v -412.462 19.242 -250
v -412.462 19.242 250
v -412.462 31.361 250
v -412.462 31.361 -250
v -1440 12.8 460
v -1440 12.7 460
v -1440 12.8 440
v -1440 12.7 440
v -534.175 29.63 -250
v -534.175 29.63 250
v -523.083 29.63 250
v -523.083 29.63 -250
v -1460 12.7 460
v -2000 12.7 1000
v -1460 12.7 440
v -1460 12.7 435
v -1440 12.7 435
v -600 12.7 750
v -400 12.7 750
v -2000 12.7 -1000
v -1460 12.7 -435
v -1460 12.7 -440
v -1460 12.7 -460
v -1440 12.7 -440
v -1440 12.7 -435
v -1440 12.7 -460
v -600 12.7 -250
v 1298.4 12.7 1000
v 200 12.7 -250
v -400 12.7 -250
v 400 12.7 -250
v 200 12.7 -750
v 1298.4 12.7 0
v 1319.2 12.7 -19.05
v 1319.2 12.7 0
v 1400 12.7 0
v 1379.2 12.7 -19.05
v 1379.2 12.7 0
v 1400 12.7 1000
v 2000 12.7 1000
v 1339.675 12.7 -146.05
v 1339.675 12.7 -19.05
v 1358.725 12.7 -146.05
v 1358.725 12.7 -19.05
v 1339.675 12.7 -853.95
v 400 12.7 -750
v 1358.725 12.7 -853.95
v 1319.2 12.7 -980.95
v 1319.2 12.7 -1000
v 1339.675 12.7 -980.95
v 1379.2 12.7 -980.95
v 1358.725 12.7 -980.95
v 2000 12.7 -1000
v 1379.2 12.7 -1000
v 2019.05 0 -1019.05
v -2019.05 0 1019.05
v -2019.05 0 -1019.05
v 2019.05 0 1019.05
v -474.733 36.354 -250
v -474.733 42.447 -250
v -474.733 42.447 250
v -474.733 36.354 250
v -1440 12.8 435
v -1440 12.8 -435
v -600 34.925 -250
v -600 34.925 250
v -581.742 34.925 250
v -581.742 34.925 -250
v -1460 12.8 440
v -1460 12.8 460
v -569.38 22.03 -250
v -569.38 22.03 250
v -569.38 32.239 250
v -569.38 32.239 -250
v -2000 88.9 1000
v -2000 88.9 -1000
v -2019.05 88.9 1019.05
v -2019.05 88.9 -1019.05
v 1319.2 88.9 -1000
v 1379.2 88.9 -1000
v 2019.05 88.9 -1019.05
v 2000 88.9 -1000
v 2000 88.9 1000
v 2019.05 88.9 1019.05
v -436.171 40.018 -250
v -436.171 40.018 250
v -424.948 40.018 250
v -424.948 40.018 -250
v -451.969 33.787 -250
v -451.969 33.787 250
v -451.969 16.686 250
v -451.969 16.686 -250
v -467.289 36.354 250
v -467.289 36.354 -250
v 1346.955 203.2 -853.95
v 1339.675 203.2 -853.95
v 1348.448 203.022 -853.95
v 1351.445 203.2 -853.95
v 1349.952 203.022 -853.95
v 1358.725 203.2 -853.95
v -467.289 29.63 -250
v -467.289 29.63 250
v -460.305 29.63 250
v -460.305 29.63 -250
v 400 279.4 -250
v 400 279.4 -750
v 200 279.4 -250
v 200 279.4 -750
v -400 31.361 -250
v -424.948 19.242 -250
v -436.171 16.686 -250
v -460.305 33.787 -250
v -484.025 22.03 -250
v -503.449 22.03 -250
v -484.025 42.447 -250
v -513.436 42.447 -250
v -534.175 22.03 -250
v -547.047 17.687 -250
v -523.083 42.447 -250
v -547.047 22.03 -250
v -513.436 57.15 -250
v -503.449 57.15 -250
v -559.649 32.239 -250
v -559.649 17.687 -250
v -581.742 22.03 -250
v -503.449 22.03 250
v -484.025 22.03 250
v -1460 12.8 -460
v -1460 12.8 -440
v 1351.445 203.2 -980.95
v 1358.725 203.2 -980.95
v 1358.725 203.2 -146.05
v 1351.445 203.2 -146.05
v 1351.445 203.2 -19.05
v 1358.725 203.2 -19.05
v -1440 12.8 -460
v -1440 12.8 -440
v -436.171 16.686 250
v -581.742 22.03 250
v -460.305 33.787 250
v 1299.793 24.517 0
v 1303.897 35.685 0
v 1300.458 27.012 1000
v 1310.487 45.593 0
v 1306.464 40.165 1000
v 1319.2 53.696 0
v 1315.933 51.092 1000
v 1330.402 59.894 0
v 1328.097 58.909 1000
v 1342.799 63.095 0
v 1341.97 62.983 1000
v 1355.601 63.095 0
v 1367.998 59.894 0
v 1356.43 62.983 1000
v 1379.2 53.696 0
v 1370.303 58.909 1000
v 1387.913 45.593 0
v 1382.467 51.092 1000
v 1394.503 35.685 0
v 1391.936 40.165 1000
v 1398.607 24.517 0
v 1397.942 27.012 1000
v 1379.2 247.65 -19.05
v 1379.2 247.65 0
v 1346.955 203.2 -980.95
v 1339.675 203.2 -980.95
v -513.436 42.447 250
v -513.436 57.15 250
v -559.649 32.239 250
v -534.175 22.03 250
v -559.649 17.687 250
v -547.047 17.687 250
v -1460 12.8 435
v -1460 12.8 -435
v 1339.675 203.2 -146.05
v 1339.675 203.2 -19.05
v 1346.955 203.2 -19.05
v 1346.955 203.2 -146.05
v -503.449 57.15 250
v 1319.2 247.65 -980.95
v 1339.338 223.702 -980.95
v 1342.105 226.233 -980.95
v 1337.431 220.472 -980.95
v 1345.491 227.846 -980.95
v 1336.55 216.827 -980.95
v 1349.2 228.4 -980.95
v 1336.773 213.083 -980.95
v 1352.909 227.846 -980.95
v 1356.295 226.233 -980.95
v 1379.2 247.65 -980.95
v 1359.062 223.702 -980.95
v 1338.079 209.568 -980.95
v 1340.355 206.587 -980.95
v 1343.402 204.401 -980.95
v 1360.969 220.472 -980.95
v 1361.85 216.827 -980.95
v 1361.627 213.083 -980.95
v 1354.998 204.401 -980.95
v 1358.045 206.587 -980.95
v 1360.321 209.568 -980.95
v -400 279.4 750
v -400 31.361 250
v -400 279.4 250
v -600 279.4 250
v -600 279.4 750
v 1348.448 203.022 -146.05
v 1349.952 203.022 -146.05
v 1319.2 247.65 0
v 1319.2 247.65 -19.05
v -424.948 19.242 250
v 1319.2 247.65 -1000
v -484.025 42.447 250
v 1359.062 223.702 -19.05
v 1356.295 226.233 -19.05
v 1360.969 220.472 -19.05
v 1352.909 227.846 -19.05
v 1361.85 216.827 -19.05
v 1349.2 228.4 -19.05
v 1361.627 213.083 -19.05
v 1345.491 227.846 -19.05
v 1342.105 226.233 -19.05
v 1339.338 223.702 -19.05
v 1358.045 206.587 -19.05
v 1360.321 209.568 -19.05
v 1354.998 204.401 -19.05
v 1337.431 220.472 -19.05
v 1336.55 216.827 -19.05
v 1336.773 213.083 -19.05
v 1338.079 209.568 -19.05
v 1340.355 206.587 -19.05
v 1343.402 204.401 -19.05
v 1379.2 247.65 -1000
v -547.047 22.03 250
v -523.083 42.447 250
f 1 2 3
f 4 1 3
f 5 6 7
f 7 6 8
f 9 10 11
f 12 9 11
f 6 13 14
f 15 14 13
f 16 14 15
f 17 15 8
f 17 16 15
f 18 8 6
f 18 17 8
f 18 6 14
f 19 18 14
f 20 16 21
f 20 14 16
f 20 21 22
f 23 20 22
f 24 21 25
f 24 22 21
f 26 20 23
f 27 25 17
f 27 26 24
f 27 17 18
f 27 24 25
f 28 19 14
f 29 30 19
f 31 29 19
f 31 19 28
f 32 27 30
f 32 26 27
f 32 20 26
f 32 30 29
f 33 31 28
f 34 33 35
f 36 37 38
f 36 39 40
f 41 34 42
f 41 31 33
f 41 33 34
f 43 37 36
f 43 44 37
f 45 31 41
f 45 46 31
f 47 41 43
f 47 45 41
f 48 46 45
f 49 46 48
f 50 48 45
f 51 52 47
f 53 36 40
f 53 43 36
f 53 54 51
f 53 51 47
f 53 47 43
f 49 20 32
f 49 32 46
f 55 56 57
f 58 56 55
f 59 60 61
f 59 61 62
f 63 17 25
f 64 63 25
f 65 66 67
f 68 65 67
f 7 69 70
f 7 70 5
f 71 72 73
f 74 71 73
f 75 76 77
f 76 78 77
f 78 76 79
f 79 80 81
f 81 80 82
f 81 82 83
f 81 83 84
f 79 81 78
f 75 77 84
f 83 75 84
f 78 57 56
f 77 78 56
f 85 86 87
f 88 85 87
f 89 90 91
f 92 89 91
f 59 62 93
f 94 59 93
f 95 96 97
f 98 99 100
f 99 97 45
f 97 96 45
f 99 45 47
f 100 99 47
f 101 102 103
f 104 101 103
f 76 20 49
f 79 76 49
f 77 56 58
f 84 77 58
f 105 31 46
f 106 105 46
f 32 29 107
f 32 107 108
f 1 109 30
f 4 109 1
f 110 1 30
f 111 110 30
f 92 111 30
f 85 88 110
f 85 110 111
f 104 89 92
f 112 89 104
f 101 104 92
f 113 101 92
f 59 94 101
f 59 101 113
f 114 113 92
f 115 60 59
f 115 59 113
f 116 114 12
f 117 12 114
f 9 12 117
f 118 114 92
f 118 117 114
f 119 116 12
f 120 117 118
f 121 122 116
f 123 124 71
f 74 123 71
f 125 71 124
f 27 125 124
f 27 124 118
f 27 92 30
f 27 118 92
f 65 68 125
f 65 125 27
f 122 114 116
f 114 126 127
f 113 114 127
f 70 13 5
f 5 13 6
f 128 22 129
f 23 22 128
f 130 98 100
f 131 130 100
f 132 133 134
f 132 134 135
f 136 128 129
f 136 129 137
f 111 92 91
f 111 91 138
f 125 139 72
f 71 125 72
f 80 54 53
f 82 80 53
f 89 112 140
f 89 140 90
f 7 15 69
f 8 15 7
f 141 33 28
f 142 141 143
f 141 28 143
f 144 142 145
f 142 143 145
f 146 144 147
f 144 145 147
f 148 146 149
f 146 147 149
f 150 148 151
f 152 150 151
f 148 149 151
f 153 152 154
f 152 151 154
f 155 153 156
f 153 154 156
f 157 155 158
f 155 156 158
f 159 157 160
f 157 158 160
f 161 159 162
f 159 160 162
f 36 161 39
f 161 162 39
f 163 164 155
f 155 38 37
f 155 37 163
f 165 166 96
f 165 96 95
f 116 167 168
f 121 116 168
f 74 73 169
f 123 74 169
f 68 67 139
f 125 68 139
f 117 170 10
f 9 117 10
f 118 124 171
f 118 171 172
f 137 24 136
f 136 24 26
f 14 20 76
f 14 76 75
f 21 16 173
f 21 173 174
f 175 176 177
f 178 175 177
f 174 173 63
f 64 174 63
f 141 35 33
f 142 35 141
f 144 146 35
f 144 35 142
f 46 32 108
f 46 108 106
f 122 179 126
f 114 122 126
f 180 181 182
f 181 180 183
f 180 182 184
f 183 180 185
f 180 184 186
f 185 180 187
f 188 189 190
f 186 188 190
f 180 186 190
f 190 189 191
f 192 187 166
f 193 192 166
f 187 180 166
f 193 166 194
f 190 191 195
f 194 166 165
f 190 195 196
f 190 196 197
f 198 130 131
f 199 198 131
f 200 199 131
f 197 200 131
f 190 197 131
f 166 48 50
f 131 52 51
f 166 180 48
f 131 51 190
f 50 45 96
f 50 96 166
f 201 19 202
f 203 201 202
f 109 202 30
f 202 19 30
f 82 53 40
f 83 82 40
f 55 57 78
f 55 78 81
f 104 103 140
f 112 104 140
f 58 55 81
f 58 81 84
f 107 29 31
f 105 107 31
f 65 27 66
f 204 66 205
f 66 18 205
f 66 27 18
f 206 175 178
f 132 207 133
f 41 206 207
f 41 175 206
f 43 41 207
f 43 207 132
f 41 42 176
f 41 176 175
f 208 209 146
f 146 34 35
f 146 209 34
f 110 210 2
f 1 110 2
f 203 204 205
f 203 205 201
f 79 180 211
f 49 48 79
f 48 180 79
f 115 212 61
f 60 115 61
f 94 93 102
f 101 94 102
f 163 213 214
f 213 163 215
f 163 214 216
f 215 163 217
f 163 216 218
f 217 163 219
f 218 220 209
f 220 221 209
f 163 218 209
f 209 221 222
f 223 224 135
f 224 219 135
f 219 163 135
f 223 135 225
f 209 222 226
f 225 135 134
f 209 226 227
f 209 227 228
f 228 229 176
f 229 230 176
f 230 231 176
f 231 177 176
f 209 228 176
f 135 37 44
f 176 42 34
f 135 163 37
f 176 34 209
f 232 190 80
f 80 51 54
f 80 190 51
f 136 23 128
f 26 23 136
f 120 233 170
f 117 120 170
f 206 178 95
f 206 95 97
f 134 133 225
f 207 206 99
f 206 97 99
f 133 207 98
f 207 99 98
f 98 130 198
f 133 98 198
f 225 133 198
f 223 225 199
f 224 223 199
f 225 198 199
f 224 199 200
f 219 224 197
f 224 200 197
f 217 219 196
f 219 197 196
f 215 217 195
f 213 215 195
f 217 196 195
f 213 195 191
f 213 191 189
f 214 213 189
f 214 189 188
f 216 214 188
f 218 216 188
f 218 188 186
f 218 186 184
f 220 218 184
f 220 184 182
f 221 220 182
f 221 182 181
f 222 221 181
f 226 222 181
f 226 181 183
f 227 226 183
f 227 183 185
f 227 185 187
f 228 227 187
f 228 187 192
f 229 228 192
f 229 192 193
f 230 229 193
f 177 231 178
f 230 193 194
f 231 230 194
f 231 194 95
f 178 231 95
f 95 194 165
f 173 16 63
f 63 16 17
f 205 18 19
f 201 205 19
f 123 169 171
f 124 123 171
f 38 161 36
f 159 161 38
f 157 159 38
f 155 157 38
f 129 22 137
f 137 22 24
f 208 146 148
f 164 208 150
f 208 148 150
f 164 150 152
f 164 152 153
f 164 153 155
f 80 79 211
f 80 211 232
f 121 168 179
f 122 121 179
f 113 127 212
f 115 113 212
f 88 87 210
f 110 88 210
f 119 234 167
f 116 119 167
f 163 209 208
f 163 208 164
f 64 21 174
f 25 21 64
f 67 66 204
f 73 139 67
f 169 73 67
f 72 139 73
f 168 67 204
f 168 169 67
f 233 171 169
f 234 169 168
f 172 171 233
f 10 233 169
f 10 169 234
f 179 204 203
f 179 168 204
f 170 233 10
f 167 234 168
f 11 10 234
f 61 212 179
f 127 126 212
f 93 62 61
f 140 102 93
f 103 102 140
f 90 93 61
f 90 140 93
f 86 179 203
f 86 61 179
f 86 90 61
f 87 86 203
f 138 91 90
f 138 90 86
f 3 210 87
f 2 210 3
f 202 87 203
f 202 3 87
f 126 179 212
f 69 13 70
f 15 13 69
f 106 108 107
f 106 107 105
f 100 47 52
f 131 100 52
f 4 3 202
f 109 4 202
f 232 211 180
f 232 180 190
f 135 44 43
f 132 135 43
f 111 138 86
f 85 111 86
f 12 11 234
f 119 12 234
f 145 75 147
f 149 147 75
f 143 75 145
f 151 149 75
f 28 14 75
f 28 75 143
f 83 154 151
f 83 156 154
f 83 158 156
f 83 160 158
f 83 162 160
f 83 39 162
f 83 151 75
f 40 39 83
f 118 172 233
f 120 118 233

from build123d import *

# Parameters (mm, degrees)
SKETCH1_W            = 4000
SKETCH1_H            = 2000
BOSS_EXTRUDE1_DEPTH  = 12.7
SKETCH3_W            = 4038.1
SKETCH3_H            = 2038.1
SKETCH3_W_2          = 4000
SKETCH3_H_2          = 2000
BOSS_EXTRUDE2_DEPTH  = 88.9
SKETCH4_W            = 20
SKETCH4_H            = 20
BOSS_EXTRUDE3_DEPTH  = 0.1
SKETCH5_W            = 20
SKETCH5_H            = 870
BOSS_EXTRUDE4_DEPTH  = 0.1
BOSS_EXTRUDE5_DEPTH  = 1000
SKETCH7_W            = 60
SKETCH7_H            = 19.05
BOSS_EXTRUDE6_DEPTH  = 234.95
SKETCH8_W            = 19.05
SKETCH8_H            = 127
BOSS_EXTRUDE7_DEPTH  = 190.5
SKETCH9_R            = 12.7
BOSS_EXTRUDE10_DEPTH = 961.9
SKETCH10_W           = 200
SKETCH10_H           = 500
BOSS_EXTRUDE11_DEPTH = 266.7
BOSS_EXTRUDE12_DEPTH = 500


with BuildPart() as part:
    # Sketch1 → Boss-Extrude1 (new body)
    with BuildSketch(Plane(origin=(0, 0, 0), x_dir=(1, 0, 0), z_dir=(0, 1, 0))):
        Rectangle(SKETCH1_W, SKETCH1_H)
    extrude(amount=BOSS_EXTRUDE1_DEPTH)

    # Sketch3 → Boss-Extrude2 (add)
    with BuildSketch(Plane.XZ):
        Rectangle(SKETCH3_W, SKETCH3_H)
        Rectangle(SKETCH3_W_2, SKETCH3_H_2, mode=Mode.SUBTRACT)
    extrude(amount=-BOSS_EXTRUDE2_DEPTH)

    # Sketch4 → Boss-Extrude3 (add)
    with BuildSketch(Plane(origin=(0, 12.7, 0), x_dir=(1, 0, 0), z_dir=(0, 1, 0))):
        with Locations((-1450, -450)):
            Rectangle(SKETCH4_W, SKETCH4_H)
        with Locations((-1450, 450)):
            Rectangle(SKETCH4_W, SKETCH4_H)
    extrude(amount=BOSS_EXTRUDE3_DEPTH)

    # Sketch5 → Boss-Extrude4 (add)
    with BuildSketch(Plane(origin=(0, 12.7, 0), x_dir=(1, 0, 0), z_dir=(0, 1, 0))):
        with Locations((-1450, 0)):
            Rectangle(SKETCH5_W, SKETCH5_H)
    extrude(amount=BOSS_EXTRUDE4_DEPTH)

    # Sketch6 → Boss-Extrude5 (add)
    with BuildSketch(Plane(origin=(0, 0, 1000), x_dir=(-1, 0, 0), z_dir=(0, 0, -1))):
        with BuildLine():
            Line((-1400, 12.7), (-1298.4, 12.7))
            ThreePointArc((-1298.4, 12.7), (-1349.2, 63.5), (-1400, 12.7))
        make_face()
    extrude(amount=BOSS_EXTRUDE5_DEPTH)

    # Sketch7 → Boss-Extrude6 (add)
    with BuildSketch(Plane(origin=(0, 12.7, 0), x_dir=(1, 0, 0), z_dir=(0, 1, 0))):
        Polygon((1319.2, 19.05), (1319.2, 0), (1379.2, 0), (1379.2, 19.05), (1358.725, 19.05), (1339.675, 19.05), align=None)
        with Locations((1349.2, 990.475)):
            Rectangle(SKETCH7_W, SKETCH7_H)
    extrude(amount=BOSS_EXTRUDE6_DEPTH)

    # Sketch8 → Boss-Extrude7 (add)
    with BuildSketch(Plane(origin=(0, 12.7, 0), x_dir=(1, 0, 0), z_dir=(0, 1, 0))):
        with Locations((1349.2, 82.55)):
            Rectangle(SKETCH8_W, SKETCH8_H)
        with Locations((1349.2, 917.45)):
            Rectangle(SKETCH8_W, SKETCH8_H)
    extrude(amount=BOSS_EXTRUDE7_DEPTH)

    # Sketch9 → Boss-Extrude10 (add)
    with BuildSketch(Plane.XY.offset(-980.95)):
        with Locations(Location((1349.2, 215.7, 0), (0, 0, 259.818251612))):
            Circle(SKETCH9_R)
    extrude(amount=BOSS_EXTRUDE10_DEPTH)

    # Sketch10 → Boss-Extrude11 (add)
    with BuildSketch(Plane(origin=(0, 12.7, 0), x_dir=(1, 0, 0), z_dir=(0, 1, 0))):
        with Locations((-500, -500)):
            Rectangle(SKETCH10_W, SKETCH10_H)
        with Locations((300, 500)):
            Rectangle(SKETCH10_W, SKETCH10_H)
    extrude(amount=BOSS_EXTRUDE11_DEPTH)

    # Sketch11 → Boss-Extrude12 (add)
    with BuildSketch(Plane(origin=(0, 0, 250), x_dir=(-1, 0, 0), z_dir=(0, 0, -1))):
        Polygon((400, 12.7), (600, 12.7), (600, 34.925), (581.742402613, 34.925), (581.742402613, 22.030410547), (569.380193931, 22.030410547), (569.380193931, 32.238860877), (559.648727247, 32.238860877), (559.648727247, 17.687045982), (547.047232043, 17.687045982), (547.047232043, 22.030410547), (534.174715465, 22.030410547), (534.174715465, 29.629778615), (523.08338878, 29.629778615), (523.08338878, 42.447311207), (513.43581408, 42.447311207), (513.43581408, 57.15), (503.449058841, 57.15), (503.449058841, 22.030410547), (484.025227404, 22.030410547), (484.025227404, 42.447311207), (474.732898947, 42.447311207), (474.732898947, 36.354281235), (467.288779018, 36.354281235), (467.288779018, 29.629778615), (460.304552482, 29.629778615), (460.304552482, 33.786722079), (451.969100899, 33.786722079), (451.969100899, 16.685714799), (436.17051685, 16.685714799), (436.17051685, 40.017600307), (424.947561297, 40.017600307), (424.947561297, 19.241956924), (412.462295028, 19.241956924), (412.462295028, 31.360821094), (400, 31.360821094), align=None)
    extrude(amount=BOSS_EXTRUDE12_DEPTH)


solid = part.part
